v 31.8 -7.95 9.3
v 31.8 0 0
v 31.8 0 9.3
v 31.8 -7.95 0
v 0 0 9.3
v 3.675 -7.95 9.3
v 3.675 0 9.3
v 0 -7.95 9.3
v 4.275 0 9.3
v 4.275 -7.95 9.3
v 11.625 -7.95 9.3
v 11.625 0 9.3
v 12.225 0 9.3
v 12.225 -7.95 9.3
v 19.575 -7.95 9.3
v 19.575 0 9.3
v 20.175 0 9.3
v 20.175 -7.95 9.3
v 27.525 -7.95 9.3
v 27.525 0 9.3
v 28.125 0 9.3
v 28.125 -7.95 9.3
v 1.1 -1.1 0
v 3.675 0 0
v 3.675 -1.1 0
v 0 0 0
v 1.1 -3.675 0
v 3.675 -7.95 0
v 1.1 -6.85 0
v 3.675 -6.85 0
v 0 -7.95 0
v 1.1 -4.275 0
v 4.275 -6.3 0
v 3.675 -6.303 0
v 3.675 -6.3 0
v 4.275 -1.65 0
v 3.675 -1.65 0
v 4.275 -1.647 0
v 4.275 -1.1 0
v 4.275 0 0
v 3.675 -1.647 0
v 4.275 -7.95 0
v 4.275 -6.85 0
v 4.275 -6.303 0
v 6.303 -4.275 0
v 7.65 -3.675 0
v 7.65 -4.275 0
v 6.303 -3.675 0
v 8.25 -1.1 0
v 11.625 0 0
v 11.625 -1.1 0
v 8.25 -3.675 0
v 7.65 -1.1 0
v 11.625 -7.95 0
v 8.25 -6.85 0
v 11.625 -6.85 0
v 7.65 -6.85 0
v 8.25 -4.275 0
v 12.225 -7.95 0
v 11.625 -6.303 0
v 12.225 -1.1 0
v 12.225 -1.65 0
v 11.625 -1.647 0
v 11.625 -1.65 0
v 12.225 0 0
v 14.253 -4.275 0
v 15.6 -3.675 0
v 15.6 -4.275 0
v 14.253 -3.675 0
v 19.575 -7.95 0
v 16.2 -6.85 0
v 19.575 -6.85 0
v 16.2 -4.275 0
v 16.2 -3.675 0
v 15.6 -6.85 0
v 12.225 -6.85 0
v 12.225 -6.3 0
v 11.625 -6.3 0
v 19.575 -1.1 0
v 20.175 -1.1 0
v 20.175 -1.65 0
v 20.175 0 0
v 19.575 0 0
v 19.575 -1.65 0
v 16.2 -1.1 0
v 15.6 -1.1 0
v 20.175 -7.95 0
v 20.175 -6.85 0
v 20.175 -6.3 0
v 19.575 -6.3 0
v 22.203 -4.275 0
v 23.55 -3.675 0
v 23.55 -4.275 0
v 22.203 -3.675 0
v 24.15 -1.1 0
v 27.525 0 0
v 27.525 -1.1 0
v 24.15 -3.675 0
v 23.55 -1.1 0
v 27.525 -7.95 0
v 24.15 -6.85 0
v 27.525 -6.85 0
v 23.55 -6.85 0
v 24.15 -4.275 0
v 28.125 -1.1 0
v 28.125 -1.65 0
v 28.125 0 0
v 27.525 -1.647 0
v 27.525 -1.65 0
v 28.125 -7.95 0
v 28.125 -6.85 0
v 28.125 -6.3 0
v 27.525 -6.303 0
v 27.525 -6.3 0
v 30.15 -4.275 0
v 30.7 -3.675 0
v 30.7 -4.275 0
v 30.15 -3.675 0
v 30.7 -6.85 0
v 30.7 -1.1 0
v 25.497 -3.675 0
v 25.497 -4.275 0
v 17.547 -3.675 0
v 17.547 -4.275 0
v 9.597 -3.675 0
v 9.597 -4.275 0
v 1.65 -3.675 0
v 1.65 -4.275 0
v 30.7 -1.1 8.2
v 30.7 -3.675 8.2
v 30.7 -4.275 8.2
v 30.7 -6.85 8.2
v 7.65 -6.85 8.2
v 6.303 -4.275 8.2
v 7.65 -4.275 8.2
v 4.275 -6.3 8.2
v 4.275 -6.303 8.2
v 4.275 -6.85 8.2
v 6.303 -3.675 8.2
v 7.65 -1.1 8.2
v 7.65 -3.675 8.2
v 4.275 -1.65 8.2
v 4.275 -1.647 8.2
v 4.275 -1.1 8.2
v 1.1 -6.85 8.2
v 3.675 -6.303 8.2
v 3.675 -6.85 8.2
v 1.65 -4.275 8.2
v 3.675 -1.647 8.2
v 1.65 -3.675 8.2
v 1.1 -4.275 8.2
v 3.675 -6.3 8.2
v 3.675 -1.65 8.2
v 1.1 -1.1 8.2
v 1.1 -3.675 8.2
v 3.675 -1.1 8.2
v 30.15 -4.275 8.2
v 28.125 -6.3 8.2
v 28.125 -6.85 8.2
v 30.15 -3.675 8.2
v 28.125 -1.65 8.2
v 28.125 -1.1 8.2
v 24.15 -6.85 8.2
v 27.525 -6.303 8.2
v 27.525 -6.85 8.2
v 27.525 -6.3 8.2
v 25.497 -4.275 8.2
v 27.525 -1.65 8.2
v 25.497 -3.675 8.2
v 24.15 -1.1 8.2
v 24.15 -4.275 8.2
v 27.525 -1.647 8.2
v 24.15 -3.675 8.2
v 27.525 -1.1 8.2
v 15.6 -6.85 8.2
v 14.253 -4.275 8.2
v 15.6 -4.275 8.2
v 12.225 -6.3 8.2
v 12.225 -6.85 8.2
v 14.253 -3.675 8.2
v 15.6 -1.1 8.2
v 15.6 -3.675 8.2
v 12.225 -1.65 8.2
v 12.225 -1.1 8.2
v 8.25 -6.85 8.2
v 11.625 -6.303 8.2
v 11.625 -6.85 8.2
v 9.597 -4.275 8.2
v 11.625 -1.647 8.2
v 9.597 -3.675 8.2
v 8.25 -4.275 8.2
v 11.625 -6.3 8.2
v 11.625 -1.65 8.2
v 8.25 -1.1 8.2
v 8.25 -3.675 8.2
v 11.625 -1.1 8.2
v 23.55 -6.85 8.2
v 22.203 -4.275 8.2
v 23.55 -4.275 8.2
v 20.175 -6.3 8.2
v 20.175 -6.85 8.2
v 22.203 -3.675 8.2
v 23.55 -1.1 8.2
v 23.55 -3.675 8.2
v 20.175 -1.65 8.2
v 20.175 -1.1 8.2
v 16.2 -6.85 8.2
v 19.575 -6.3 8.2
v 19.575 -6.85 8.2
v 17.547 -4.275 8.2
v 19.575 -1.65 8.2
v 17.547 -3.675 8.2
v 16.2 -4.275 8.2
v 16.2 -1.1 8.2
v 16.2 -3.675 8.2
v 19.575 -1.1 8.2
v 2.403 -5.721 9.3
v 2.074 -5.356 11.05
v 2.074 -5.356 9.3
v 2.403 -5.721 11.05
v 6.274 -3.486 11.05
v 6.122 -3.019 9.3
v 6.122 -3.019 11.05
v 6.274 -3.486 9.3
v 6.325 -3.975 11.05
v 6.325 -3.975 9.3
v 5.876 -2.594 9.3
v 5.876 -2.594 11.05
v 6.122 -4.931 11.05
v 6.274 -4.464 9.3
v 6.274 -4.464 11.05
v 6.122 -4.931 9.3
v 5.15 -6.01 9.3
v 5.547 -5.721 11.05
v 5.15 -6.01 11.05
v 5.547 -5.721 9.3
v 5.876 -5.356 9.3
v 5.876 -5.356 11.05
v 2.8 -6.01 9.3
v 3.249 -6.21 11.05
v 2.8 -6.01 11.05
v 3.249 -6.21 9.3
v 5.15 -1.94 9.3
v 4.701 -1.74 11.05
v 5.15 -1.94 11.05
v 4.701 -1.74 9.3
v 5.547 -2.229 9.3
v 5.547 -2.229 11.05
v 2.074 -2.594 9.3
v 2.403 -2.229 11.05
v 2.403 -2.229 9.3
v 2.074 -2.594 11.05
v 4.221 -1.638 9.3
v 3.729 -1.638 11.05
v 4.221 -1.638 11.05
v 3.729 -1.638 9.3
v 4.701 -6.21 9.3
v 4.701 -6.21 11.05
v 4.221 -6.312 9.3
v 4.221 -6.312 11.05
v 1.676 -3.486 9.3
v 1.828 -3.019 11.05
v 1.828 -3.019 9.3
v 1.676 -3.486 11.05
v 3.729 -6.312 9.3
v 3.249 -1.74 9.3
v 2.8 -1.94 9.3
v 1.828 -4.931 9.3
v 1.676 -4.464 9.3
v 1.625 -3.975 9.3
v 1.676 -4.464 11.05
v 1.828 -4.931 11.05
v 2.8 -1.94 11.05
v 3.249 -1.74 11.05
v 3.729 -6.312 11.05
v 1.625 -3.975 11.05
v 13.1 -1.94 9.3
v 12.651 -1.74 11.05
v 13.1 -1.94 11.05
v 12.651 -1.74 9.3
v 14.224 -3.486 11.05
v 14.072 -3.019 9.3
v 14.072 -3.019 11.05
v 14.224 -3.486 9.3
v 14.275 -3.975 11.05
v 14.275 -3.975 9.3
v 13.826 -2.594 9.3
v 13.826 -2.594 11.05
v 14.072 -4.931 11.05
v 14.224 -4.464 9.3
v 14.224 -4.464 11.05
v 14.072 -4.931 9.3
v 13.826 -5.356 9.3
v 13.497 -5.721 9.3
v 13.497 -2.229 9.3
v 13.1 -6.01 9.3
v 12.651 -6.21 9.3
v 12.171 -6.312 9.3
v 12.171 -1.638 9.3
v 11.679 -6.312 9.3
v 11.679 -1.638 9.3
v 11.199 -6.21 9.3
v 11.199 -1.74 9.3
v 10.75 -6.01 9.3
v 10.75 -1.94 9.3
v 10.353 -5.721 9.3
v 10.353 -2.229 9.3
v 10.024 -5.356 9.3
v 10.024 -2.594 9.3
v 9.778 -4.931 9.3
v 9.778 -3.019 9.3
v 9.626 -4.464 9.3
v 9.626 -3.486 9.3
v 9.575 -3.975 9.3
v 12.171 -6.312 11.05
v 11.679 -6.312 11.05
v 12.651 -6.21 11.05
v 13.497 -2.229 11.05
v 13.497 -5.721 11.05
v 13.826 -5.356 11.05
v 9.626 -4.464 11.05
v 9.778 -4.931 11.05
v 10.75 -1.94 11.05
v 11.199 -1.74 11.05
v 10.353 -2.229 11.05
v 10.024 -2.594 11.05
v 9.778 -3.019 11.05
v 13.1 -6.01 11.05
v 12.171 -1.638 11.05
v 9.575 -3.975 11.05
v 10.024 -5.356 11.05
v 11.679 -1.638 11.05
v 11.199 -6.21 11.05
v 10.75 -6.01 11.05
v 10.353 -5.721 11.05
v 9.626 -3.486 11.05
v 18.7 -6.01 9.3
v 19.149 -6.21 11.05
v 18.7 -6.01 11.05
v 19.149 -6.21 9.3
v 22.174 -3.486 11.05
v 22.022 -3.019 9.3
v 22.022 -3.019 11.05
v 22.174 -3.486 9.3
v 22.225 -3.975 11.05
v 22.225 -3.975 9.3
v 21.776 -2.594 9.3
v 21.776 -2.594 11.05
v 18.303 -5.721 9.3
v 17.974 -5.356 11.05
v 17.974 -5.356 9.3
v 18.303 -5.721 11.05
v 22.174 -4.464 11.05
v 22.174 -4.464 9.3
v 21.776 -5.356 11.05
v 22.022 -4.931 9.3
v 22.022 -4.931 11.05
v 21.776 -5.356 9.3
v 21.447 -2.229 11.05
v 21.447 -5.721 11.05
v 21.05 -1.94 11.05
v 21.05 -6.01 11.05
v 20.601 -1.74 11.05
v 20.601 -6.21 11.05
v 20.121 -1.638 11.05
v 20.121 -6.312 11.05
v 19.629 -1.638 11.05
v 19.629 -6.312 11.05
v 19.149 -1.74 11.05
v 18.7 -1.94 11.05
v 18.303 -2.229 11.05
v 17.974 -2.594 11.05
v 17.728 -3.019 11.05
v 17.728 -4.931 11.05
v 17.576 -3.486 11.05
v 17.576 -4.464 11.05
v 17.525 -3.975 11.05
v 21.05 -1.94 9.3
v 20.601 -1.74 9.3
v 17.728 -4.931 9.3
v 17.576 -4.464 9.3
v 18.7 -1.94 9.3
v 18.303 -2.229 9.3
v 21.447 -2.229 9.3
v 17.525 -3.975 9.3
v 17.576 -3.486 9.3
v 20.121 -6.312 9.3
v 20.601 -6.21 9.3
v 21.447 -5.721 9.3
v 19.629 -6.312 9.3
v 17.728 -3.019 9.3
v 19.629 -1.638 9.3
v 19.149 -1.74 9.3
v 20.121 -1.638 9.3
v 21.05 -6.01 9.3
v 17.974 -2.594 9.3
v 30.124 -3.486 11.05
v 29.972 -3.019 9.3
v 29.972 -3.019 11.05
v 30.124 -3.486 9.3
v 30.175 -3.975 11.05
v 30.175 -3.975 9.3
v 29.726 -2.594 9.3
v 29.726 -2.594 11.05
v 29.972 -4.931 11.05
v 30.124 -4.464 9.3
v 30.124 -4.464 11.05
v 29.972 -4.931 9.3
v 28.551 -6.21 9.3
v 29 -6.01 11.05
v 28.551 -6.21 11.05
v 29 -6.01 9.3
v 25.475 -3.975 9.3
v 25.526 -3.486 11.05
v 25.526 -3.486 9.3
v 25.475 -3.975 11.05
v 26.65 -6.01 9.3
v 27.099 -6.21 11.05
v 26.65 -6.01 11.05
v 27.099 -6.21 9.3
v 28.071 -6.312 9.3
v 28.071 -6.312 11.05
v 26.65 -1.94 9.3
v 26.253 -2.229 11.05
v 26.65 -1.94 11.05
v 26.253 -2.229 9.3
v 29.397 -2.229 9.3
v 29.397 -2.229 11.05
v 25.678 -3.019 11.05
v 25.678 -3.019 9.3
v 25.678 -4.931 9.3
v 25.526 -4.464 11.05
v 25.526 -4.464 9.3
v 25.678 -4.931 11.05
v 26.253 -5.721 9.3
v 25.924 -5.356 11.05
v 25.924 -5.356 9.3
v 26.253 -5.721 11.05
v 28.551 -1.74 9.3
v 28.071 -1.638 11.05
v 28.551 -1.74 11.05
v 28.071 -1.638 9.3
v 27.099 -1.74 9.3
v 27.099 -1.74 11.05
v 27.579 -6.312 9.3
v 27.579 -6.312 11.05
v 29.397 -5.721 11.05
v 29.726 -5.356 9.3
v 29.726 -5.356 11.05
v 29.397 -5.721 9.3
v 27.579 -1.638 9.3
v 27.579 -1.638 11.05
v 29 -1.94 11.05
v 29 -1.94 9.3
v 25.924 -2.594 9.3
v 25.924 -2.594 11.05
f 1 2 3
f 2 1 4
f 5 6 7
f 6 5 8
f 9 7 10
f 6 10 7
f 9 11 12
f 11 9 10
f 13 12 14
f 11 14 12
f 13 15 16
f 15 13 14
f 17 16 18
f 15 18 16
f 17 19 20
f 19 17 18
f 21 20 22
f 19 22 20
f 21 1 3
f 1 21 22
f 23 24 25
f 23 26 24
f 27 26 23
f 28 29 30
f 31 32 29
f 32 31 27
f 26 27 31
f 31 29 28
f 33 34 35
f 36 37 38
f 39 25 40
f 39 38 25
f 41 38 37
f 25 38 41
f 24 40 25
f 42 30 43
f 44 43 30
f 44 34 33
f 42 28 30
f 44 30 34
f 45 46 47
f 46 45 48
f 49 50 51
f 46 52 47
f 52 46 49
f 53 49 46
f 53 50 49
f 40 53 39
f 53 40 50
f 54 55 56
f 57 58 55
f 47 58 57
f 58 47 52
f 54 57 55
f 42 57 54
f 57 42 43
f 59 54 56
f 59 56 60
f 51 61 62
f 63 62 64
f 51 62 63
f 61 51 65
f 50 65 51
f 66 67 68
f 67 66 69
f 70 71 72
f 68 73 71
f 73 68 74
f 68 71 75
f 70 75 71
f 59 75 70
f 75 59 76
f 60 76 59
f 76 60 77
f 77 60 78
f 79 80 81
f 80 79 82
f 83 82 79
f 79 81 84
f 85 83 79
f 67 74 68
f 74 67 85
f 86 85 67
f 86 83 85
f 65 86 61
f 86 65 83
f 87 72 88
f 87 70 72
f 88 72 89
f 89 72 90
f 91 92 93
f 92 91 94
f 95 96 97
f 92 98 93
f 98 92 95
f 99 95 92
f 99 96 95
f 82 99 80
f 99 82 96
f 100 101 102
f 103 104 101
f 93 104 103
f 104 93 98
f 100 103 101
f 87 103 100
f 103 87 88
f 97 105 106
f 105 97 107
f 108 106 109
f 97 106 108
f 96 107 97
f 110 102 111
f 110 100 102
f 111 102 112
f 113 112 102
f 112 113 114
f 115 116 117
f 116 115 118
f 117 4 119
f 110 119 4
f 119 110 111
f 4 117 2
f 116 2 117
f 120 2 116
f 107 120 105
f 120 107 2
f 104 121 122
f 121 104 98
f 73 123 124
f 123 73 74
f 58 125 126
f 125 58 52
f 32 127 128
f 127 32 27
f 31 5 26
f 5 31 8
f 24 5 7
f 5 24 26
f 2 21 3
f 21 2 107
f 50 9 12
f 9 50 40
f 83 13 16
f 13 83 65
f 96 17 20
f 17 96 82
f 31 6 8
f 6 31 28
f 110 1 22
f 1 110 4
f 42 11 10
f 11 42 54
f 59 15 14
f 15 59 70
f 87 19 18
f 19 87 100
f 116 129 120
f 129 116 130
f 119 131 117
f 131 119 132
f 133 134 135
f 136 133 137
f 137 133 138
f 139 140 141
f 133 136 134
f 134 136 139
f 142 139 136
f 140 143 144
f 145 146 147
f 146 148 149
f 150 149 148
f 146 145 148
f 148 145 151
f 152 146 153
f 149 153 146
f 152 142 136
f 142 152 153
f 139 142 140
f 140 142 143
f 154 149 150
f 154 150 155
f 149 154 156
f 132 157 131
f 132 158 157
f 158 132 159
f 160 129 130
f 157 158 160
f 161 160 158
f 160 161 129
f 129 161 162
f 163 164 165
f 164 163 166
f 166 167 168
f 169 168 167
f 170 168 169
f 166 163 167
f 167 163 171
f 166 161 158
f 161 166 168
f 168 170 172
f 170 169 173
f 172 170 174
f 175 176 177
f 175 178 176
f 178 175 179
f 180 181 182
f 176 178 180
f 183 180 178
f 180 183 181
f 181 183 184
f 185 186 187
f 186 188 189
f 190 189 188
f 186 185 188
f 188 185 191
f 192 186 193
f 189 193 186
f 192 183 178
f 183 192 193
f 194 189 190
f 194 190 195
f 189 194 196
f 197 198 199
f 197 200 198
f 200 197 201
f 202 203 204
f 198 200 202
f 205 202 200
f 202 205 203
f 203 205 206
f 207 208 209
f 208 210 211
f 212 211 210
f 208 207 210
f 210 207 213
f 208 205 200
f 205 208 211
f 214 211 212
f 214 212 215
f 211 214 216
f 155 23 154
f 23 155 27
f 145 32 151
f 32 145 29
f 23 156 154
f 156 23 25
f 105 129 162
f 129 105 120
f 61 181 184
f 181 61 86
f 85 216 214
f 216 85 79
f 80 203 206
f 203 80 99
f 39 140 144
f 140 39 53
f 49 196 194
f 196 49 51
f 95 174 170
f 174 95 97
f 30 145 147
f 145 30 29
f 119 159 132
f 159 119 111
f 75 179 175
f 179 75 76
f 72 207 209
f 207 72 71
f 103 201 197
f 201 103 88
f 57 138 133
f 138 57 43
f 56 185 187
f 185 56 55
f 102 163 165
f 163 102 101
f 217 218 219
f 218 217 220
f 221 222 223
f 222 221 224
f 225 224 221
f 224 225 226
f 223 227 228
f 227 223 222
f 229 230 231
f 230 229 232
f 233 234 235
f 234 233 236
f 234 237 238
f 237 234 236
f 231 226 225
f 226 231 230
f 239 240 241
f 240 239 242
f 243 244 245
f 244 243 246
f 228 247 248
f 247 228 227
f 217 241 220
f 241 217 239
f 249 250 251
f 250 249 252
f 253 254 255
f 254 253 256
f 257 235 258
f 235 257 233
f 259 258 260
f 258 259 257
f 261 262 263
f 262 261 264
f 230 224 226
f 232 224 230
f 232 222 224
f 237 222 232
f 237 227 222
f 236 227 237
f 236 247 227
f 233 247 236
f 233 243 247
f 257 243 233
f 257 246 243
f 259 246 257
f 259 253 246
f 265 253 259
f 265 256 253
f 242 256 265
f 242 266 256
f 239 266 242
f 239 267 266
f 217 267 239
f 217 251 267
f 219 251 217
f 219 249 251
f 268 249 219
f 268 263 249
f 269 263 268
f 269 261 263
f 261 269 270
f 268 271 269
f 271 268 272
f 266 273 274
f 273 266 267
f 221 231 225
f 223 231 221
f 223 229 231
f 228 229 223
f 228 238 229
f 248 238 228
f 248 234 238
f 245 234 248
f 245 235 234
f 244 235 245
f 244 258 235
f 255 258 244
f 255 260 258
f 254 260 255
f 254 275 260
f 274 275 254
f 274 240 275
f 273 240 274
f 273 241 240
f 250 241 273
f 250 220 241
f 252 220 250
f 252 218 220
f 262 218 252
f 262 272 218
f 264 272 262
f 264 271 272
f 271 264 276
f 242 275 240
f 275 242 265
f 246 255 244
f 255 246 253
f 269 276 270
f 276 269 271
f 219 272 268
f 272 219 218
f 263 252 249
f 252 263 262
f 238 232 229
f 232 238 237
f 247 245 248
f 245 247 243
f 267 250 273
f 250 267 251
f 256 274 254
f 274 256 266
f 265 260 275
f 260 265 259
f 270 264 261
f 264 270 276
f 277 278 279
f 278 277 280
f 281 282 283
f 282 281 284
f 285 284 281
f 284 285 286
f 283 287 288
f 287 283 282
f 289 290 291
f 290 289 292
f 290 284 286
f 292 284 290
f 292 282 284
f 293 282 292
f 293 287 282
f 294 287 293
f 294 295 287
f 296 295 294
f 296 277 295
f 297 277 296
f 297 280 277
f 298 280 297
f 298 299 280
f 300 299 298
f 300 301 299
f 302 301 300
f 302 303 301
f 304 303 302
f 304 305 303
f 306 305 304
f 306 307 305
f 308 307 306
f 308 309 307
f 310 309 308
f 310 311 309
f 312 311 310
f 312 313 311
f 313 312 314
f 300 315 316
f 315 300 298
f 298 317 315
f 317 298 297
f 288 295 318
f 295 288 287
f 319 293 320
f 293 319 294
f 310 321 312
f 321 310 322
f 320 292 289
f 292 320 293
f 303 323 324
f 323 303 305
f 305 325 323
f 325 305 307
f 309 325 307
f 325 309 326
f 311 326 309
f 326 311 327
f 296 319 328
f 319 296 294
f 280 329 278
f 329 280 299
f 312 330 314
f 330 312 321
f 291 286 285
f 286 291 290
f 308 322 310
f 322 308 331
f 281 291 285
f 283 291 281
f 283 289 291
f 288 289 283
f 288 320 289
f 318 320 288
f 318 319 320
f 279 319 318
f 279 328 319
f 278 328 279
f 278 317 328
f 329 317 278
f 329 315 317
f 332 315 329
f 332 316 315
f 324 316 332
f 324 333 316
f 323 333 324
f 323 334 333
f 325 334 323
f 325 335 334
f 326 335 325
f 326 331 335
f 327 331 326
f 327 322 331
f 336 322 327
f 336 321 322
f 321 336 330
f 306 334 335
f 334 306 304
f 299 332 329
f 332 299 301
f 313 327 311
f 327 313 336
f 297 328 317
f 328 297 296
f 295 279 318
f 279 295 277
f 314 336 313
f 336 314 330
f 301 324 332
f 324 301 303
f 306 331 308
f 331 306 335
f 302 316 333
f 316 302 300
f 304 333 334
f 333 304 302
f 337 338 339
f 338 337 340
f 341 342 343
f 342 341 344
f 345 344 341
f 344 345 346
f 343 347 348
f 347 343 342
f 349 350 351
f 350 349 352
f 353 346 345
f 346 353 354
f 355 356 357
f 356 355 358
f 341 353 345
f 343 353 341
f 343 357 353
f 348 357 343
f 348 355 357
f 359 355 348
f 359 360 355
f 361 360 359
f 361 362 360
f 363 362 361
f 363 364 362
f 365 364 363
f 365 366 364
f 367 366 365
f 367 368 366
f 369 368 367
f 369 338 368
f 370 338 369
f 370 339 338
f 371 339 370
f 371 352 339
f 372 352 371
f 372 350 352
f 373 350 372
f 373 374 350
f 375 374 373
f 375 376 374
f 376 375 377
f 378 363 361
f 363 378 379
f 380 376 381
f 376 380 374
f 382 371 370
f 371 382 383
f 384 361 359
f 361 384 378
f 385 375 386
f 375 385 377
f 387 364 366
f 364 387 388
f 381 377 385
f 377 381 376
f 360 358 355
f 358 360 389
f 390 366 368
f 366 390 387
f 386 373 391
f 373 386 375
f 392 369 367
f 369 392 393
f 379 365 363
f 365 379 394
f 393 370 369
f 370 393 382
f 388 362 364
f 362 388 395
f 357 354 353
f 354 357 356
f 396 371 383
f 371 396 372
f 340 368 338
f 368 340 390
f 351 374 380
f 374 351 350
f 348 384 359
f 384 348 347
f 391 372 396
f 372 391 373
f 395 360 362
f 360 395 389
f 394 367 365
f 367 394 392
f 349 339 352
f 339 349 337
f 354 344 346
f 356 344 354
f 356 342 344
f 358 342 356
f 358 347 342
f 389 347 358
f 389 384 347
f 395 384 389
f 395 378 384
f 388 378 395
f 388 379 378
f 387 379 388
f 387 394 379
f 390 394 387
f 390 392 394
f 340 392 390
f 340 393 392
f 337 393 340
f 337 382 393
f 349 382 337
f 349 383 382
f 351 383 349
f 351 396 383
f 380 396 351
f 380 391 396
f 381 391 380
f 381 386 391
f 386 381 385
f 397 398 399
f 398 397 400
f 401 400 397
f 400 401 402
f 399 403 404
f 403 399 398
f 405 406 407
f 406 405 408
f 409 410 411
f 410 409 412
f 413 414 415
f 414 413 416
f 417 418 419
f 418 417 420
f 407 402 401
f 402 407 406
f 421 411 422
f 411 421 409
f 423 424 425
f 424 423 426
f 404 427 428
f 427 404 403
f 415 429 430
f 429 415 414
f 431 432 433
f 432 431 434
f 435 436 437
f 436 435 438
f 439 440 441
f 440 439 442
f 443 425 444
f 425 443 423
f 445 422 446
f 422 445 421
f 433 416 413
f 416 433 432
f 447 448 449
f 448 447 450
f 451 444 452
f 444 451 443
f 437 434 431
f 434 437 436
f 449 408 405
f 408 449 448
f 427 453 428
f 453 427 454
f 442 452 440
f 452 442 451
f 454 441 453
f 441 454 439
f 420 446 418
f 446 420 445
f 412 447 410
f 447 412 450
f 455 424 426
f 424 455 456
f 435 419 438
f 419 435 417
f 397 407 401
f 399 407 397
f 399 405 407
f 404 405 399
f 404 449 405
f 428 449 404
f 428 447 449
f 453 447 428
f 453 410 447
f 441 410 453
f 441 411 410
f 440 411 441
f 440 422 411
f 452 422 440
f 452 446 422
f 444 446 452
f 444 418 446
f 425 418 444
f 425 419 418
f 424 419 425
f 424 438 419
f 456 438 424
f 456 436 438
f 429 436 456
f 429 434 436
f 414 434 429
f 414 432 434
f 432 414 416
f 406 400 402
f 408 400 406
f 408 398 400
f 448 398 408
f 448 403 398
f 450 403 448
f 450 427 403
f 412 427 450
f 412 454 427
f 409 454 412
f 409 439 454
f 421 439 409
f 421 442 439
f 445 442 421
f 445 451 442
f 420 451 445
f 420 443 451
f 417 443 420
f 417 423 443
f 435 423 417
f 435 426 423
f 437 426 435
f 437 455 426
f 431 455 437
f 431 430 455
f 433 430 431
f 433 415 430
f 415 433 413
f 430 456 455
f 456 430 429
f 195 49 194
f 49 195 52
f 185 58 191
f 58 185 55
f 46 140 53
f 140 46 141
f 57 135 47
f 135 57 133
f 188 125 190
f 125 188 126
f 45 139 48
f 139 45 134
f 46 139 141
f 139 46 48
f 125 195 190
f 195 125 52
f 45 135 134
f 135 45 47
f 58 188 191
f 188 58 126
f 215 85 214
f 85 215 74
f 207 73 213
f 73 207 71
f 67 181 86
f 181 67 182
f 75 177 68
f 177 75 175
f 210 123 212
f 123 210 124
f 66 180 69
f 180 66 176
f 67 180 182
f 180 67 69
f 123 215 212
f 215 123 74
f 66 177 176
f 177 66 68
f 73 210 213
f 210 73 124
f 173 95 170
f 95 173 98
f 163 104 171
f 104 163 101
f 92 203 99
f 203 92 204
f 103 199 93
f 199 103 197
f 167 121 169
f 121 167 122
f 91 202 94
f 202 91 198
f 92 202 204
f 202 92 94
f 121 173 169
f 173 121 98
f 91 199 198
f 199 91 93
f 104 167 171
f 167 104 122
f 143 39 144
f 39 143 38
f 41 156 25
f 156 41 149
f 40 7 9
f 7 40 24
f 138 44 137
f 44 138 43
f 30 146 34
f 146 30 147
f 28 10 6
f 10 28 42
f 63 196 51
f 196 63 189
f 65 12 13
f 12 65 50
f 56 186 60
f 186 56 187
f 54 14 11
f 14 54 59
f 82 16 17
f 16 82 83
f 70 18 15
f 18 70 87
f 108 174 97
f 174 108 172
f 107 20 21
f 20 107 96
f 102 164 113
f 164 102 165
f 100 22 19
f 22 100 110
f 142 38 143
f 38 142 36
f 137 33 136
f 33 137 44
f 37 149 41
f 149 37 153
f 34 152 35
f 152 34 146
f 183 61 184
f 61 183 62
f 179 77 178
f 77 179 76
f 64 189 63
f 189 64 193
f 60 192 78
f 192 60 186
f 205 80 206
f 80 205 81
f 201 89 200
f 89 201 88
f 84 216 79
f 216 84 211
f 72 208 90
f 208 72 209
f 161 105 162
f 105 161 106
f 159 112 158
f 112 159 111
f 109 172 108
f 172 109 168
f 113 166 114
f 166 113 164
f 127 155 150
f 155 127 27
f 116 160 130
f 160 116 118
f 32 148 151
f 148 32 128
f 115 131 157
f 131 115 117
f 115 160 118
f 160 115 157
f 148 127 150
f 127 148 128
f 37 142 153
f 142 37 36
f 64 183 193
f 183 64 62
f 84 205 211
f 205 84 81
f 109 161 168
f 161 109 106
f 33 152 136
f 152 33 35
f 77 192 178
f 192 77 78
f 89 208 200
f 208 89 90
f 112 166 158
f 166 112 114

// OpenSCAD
// file: lib/doblo-params.scad
/*

 Copyright (c) 2013 Daniel M. Taub
 Copyright (c) 2010 Daniel K. Schneider
 
 This file is part of DobloFactory.

 DobloFactory is free source: you can redistribute it and/or modify
    modify it under the terms of the CC BY-NC-SA 3.0 License:
    CreativeCommons Attribution-NonCommerical-ShareAlike 3.0
    as published by Creative Commons. 

    You should have received a copy of the CC BY-NC-SA 3.0 License 
    with this source package. 
    If not, see <http://creativecommons.org/licenses/by-nc-sa/3.0/>

-------------------------
PARAMETERS              -
-------------------------

These define in principle all dimensions. 

Close to DUPLO dimensions by default. Depending on your printer and your layer/thickness printing parameters you do want to change nibbles and walls.
The settings below are for a layer Thickness of 0.25mm

All units are mm.

Dimensions: 
* A typical small 2x2 nibbles on top DUPLO compatible brick with one nibble underneath is
32mm x 32mm x 19.2mm (plus a nibble height of 4.5mm)
* LEGO-compatible bricks are half that size in all three dimensions

*/



// DATA FOR QUATRO (DMT)
// nibble outter diam: 18.45 
// nibble inner diam: 14.45 
// nibble inner nub(for duplo) diam: 13.25 

// Normal size (DUPLO)
// SCALE = 1;
// Lego size - see also the hacks in the code for fixing wall and nibble dimensions
// SCALE = 0.5 ;
// Mini Lego size 
// SCALE = 0.25

CADRO = 2; // not yet tested
DOBLO = 1;
LUGO = 0.5;
MINI = 0.25;

HALF=3;
THIRD=2;
FULL=6;

// LEGO SCALE - don't change, allows to create nano legos, should be 1 if real Legos
function LEGO_SCALE(SCALE) = 2 * SCALE;

// Doblo block size
// Real DUPLO Block = 31.7 / 2 = 15.85 (with some variations)
function PART_WIDTH(SCALE)  = 16.0  * SCALE;

// Block height (a typical block is 4 * PART_HEIGHT)
// Real Duplo Block = 19.17 / 4 = 4.8
// we also measured 19.09, 19.16
//function PART_HEIGHT(SCALE)  = ((SCALE < 0.6) && LEGO_DIV) ? ( 3.2 * LEGO_SCALE(SCALE) ) : ( 4.8 * SCALE );
function PART_HEIGHT(SCALE)  = (SCALE < 0.6) ? ( 1.6 * LEGO_SCALE(SCALE) ) : ( 3.2 * SCALE );
// Diamonds - anti-warping holes - used optionally
DIAMOND = 4;



// Top nibble size definitions
// Must be adjusted with respect to layer resolution and other slicing considerations
function NO(SCALE)         = PART_WIDTH(SCALE) / 2.0;              //nibble offset
function NBO(SCALE)        = PART_WIDTH(SCALE);                   // nibble bottom offset
function NH(SCALE)         = (SCALE < 0.6) ? 1.75 * LEGO_SCALE(SCALE) : 4.55 * SCALE;  // LEGO vs. DUPLO 
function NB_RADIUS(SCALE)  = (SCALE < 0.6) ? (4.9 / 2 * LEGO_SCALE(SCALE)) : (9.2 / 2.0 * SCALE);    // radius Lego vs. DUPLO

// Real DUPLO Block = 9.38 
function NB_RADIUS_INSIDE(SCALE) = 6.8/2  * SCALE;  
// 6.44 = Real DUPLO block

function NB_THICKNESS(SCALE)=NB_RADIUS(SCALE)-NB_RADIUS_INSIDE(SCALE);

// For square nibble supports in 1xM or Nx1 blocks
function ALONG_LEN(SCALE)  = (PART_WIDTH(SCALE)-NB_RADIUS(SCALE))/1.7; //tighter fit than 1.8
function CROSS_LEN(SCALE)  = (PART_WIDTH(SCALE)-NB_RADIUS(SCALE)/2);

// Bottom nibbles size definitions
// Must be adjusted with respect to layer resolution and other slicing considerations
function NB_BOTTOM_RADIUS(SCALE)        = (SCALE < 0.6) ? 6.5/2*LEGO_SCALE(SCALE) : 13.4/2*SCALE;
function NB_BOTTOM_RADIUS_THIN(SCALE)        = (SCALE < 0.6) ? 3.5/2*LEGO_SCALE(SCALE) : 7.2/2*SCALE;
// Real DUPLO = 13.48
function NB_BOTTOM_RADIUS_INSIDE(SCALE) = (SCALE < 0.6) ? 4.8/2*LEGO_SCALE(SCALE) : 10.8/2*SCALE;
// Real DUPLO = 10.73
// rapman 10.6
// Real Lego = 4.9

// walls - IMPORTANT: must be adjusted with respect to layer resolution and other slicing considerations
function DOBLOWALL(SCALE) = (SCALE < 0.6) ? 1.2 * LEGO_SCALE(SCALE): 1.55 *SCALE; // Lego vs. Duplo, Lego is not 2x smaller

function USE_INSET(SCALE) = (SCALE < 0.6) ? true : true;
function INSET_WIDTH(SCALE)    = (SCALE < 0.6) ? 0.4 *LEGO_SCALE(SCALE) : 1.50 * SCALE; //little inset walls to make it stick
function INSET_LENGTH(SCALE)  = (SCALE < 0.6) ? 3*DOBLOWALL(SCALE) : 4*DOBLOWALL(SCALE); // Legos have proportionally smaller insets

//lattice width and height (optional, see LATTICE_TYPE)
// A grid underneath the flat bridge, crossing through the nibbles underneath
function LATTICE_WIDTH(SCALE)   = 1.50 * SCALE;

// 0 means none, 1 means more spacing (same as nibbles underneath),
// 2 means denser
LATTICE_TYPE    = 1; 

// Sizes of a standard 2x2 square brick, normal height
// Not used, but are practical in your custom modules
function DOBLOWIDTH(SCALE)  = PART_WIDTH(SCALE)  * 2.0  * SCALE;
function DOBLOHEIGHT(SCALE) = PART_HEIGHT(SCALE) * 6.0  * SCALE;
function LEGOHEIGHT(SCALE)  = PART_HEIGHT(SCALE) * 6.0  * SCALE; 
// file: lib/doblo-params-repl.scad
/*

 Copyright (c) 2013 Daniel M. Taub
 Copyright (c) 2010 Daniel K. Schneider
 
 This file is part of DobloFactory.

 DobloFactory is free source: you can redistribute it and/or modify
    modify it under the terms of the CC BY-NC-SA 3.0 License:
    CreativeCommons Attribution-NonCommerical-ShareAlike 3.0
    as published by Creative Commons. 

    You should have received a copy of the CC BY-NC-SA 3.0 License 
    with this source package. 
    If not, see <http://creativecommons.org/licenses/by-nc-sa/3.0/>

-------------------------
PARAMETERS              -
-------------------------

These define in principle all dimensions. 

Close to DUPLO dimensions by default. Depending on your printer and your layer/thickness printing parameters you do want to change nibbles and walls.
The settings below are for a layer Thickness of 0.25mm

All units are mm.

Dimensions: 
* A typical small 2x2 nibbles on top DUPLO compatible brick with one nibble underneath is
32mm x 32mm x 19.2mm (plus a nibble height of 4.5mm)
* LEGO-compatible bricks are half that size in all three dimensions

*/

// replicator is 12 x 7 duplo-sized units

// DATA FOR QUATRO (DMT)
// nibble outter diam: 18.45 
// nibble inner diam: 14.45 
// nibble inner nub(for duplo) diam: 13.25 

// Normal size (DUPLO)
// SCALE = 1;
// Lego size - see also the hacks in the code for fixing wall and nibble dimensions
// SCALE = 0.5 ;
// Mini Lego size 
// SCALE = 0.25

CADRO = 2; // not yet tested
DOBLO = 1;
LUGO = 0.5;
MINI = 0.25;

HALF=3;
THIRD=2;
FULL=6;

// LEGO SCALE - don't change, allows to create nano legos, should be 1 if real Legos
function LEGO_SCALE(SCALE) = 2 * SCALE;

// Doblo block size
// Real DUPLO Block = 31.7 / 2 = 15.85 (with some variations)
function PART_WIDTH(SCALE)  = 15.9  * SCALE;

// Block height (a typical block is 4 * PART_HEIGHT)
// Real Duplo Block = 19.17 / 4 = 4.8
// we also measured 19.09, 19.16
//function PART_HEIGHT(SCALE)  = ((SCALE < 0.6) && LEGO_DIV) ? ( 3.2 * LEGO_SCALE(SCALE) ) : ( 4.8 * SCALE );
function PART_HEIGHT(SCALE)  = (SCALE < 0.6) ? ( 1.55 * LEGO_SCALE(SCALE) ) : ( 3.2 * SCALE );

// Diamonds - anti-warping holes - used optionally
DIAMOND = 4;



// Top nibble size definitions
// Must be adjusted with respect to layer resolution and other slicing considerations
function NO(SCALE)         = PART_WIDTH(SCALE) / 2.0;              //nibble offset
function NBO(SCALE)        = PART_WIDTH(SCALE);                   // nibble bottom offset
function NH(SCALE)         = (SCALE < 0.6) ? 1.75 * LEGO_SCALE(SCALE) : 4.55 * SCALE;  // LEGO vs. DUPLO 


function NB_RADIUS(SCALE)  = (SCALE < 0.6) ? (4.7 / 2 * LEGO_SCALE(SCALE)) : (9.35 / 2.0 * SCALE);    // radius Lego vs. DUPLO
// Real DUPLO Block = 9.38 

function NB_RADIUS_INSIDE(SCALE) = 7.0/2  * SCALE;  
// 6.44 = Real DUPLO block

function NB_THICKNESS(SCALE)=NB_RADIUS(SCALE)-NB_RADIUS_INSIDE(SCALE);

// For square nibble supports in 1xM or Nx1 blocks
function ALONG_LEN(SCALE)  = (PART_WIDTH(SCALE)-NB_RADIUS(SCALE))/1.7; //tighter fit than 1.8
function CROSS_LEN(SCALE)  = (PART_WIDTH(SCALE)-NB_RADIUS(SCALE)/2);

// Bottom nibbles size definitions
// Must be adjusted with respect to layer resolution and other slicing considerations
function NB_BOTTOM_RADIUS(SCALE)        = (SCALE < 0.6) ? 6.6/2*LEGO_SCALE(SCALE) : 13.2/2*SCALE; //was 13.4(3)
function NB_BOTTOM_RADIUS_THIN(SCALE)        = (SCALE < 0.6) ? 3.2/2*LEGO_SCALE(SCALE) : 7.0/2*SCALE;
// Real DUPLO = 13.48
function NB_BOTTOM_RADIUS_INSIDE(SCALE) = (SCALE < 0.6) ? 4.8/2*LEGO_SCALE(SCALE) : 10.9/2*SCALE; //was 10.8
// Real DUPLO = 10.73
// rapman 10.6
// Real Lego = 4.9

// walls - IMPORTANT: must be adjusted with respect to layer resolution and other slicing considerations

function DOBLOWALL(SCALE) = (SCALE < 0.6) ? 1.1 * LEGO_SCALE(SCALE): 1.6 *SCALE; // Lego vs. Duplo, Lego is not 2x smaller

function USE_INSET(SCALE) = true;//(SCALE < 0.6) ? false : true;
function INSET_WIDTH(SCALE)    = (SCALE < 0.6) ? 0.6 *LEGO_SCALE(SCALE) : 1.52 * SCALE; //little inset walls to make it stick
function INSET_LENGTH(SCALE)  = (SCALE < 0.6) ? 3*DOBLOWALL(SCALE) : 4*DOBLOWALL(SCALE); // Legos have proportionally smaller insets

//lattice width and height (optional, see LATTICE_TYPE)
// A grid underneath the flat bridge, crossing through the nibbles underneath
function LATTICE_WIDTH(SCALE)   = 1.50 * SCALE;

// 0 means none, 1 means more spacing (same as nibbles underneath),
// 2 means denser
LATTICE_TYPE    = 1; 

// Sizes of a standard 2x2 square brick, normal height
// Not used, but are practical in your custom modules
function DOBLOWIDTH(SCALE)  = PART_WIDTH(SCALE)  * 2.0  * SCALE;
function DOBLOHEIGHT(SCALE) = PART_HEIGHT(SCALE) * 6.0  * SCALE;
function LEGOHEIGHT(SCALE)  = PART_HEIGHT(SCALE) * 6.0  * SCALE; // If LEGO_DIV == true
// main file
include <doblo-factory.scad>;
include <lib/doblo-params-repl.scad>;

//doblo   (0,   0,   0,   2,   2,    FULL,  true, false, DOBLO);
//doblo   (0,   0,   0,   2,   2,    FULL,  true, false, LUGO);
doblo   (0,   0,   0,   4,   1,    FULL,  true, false, LUGO);
